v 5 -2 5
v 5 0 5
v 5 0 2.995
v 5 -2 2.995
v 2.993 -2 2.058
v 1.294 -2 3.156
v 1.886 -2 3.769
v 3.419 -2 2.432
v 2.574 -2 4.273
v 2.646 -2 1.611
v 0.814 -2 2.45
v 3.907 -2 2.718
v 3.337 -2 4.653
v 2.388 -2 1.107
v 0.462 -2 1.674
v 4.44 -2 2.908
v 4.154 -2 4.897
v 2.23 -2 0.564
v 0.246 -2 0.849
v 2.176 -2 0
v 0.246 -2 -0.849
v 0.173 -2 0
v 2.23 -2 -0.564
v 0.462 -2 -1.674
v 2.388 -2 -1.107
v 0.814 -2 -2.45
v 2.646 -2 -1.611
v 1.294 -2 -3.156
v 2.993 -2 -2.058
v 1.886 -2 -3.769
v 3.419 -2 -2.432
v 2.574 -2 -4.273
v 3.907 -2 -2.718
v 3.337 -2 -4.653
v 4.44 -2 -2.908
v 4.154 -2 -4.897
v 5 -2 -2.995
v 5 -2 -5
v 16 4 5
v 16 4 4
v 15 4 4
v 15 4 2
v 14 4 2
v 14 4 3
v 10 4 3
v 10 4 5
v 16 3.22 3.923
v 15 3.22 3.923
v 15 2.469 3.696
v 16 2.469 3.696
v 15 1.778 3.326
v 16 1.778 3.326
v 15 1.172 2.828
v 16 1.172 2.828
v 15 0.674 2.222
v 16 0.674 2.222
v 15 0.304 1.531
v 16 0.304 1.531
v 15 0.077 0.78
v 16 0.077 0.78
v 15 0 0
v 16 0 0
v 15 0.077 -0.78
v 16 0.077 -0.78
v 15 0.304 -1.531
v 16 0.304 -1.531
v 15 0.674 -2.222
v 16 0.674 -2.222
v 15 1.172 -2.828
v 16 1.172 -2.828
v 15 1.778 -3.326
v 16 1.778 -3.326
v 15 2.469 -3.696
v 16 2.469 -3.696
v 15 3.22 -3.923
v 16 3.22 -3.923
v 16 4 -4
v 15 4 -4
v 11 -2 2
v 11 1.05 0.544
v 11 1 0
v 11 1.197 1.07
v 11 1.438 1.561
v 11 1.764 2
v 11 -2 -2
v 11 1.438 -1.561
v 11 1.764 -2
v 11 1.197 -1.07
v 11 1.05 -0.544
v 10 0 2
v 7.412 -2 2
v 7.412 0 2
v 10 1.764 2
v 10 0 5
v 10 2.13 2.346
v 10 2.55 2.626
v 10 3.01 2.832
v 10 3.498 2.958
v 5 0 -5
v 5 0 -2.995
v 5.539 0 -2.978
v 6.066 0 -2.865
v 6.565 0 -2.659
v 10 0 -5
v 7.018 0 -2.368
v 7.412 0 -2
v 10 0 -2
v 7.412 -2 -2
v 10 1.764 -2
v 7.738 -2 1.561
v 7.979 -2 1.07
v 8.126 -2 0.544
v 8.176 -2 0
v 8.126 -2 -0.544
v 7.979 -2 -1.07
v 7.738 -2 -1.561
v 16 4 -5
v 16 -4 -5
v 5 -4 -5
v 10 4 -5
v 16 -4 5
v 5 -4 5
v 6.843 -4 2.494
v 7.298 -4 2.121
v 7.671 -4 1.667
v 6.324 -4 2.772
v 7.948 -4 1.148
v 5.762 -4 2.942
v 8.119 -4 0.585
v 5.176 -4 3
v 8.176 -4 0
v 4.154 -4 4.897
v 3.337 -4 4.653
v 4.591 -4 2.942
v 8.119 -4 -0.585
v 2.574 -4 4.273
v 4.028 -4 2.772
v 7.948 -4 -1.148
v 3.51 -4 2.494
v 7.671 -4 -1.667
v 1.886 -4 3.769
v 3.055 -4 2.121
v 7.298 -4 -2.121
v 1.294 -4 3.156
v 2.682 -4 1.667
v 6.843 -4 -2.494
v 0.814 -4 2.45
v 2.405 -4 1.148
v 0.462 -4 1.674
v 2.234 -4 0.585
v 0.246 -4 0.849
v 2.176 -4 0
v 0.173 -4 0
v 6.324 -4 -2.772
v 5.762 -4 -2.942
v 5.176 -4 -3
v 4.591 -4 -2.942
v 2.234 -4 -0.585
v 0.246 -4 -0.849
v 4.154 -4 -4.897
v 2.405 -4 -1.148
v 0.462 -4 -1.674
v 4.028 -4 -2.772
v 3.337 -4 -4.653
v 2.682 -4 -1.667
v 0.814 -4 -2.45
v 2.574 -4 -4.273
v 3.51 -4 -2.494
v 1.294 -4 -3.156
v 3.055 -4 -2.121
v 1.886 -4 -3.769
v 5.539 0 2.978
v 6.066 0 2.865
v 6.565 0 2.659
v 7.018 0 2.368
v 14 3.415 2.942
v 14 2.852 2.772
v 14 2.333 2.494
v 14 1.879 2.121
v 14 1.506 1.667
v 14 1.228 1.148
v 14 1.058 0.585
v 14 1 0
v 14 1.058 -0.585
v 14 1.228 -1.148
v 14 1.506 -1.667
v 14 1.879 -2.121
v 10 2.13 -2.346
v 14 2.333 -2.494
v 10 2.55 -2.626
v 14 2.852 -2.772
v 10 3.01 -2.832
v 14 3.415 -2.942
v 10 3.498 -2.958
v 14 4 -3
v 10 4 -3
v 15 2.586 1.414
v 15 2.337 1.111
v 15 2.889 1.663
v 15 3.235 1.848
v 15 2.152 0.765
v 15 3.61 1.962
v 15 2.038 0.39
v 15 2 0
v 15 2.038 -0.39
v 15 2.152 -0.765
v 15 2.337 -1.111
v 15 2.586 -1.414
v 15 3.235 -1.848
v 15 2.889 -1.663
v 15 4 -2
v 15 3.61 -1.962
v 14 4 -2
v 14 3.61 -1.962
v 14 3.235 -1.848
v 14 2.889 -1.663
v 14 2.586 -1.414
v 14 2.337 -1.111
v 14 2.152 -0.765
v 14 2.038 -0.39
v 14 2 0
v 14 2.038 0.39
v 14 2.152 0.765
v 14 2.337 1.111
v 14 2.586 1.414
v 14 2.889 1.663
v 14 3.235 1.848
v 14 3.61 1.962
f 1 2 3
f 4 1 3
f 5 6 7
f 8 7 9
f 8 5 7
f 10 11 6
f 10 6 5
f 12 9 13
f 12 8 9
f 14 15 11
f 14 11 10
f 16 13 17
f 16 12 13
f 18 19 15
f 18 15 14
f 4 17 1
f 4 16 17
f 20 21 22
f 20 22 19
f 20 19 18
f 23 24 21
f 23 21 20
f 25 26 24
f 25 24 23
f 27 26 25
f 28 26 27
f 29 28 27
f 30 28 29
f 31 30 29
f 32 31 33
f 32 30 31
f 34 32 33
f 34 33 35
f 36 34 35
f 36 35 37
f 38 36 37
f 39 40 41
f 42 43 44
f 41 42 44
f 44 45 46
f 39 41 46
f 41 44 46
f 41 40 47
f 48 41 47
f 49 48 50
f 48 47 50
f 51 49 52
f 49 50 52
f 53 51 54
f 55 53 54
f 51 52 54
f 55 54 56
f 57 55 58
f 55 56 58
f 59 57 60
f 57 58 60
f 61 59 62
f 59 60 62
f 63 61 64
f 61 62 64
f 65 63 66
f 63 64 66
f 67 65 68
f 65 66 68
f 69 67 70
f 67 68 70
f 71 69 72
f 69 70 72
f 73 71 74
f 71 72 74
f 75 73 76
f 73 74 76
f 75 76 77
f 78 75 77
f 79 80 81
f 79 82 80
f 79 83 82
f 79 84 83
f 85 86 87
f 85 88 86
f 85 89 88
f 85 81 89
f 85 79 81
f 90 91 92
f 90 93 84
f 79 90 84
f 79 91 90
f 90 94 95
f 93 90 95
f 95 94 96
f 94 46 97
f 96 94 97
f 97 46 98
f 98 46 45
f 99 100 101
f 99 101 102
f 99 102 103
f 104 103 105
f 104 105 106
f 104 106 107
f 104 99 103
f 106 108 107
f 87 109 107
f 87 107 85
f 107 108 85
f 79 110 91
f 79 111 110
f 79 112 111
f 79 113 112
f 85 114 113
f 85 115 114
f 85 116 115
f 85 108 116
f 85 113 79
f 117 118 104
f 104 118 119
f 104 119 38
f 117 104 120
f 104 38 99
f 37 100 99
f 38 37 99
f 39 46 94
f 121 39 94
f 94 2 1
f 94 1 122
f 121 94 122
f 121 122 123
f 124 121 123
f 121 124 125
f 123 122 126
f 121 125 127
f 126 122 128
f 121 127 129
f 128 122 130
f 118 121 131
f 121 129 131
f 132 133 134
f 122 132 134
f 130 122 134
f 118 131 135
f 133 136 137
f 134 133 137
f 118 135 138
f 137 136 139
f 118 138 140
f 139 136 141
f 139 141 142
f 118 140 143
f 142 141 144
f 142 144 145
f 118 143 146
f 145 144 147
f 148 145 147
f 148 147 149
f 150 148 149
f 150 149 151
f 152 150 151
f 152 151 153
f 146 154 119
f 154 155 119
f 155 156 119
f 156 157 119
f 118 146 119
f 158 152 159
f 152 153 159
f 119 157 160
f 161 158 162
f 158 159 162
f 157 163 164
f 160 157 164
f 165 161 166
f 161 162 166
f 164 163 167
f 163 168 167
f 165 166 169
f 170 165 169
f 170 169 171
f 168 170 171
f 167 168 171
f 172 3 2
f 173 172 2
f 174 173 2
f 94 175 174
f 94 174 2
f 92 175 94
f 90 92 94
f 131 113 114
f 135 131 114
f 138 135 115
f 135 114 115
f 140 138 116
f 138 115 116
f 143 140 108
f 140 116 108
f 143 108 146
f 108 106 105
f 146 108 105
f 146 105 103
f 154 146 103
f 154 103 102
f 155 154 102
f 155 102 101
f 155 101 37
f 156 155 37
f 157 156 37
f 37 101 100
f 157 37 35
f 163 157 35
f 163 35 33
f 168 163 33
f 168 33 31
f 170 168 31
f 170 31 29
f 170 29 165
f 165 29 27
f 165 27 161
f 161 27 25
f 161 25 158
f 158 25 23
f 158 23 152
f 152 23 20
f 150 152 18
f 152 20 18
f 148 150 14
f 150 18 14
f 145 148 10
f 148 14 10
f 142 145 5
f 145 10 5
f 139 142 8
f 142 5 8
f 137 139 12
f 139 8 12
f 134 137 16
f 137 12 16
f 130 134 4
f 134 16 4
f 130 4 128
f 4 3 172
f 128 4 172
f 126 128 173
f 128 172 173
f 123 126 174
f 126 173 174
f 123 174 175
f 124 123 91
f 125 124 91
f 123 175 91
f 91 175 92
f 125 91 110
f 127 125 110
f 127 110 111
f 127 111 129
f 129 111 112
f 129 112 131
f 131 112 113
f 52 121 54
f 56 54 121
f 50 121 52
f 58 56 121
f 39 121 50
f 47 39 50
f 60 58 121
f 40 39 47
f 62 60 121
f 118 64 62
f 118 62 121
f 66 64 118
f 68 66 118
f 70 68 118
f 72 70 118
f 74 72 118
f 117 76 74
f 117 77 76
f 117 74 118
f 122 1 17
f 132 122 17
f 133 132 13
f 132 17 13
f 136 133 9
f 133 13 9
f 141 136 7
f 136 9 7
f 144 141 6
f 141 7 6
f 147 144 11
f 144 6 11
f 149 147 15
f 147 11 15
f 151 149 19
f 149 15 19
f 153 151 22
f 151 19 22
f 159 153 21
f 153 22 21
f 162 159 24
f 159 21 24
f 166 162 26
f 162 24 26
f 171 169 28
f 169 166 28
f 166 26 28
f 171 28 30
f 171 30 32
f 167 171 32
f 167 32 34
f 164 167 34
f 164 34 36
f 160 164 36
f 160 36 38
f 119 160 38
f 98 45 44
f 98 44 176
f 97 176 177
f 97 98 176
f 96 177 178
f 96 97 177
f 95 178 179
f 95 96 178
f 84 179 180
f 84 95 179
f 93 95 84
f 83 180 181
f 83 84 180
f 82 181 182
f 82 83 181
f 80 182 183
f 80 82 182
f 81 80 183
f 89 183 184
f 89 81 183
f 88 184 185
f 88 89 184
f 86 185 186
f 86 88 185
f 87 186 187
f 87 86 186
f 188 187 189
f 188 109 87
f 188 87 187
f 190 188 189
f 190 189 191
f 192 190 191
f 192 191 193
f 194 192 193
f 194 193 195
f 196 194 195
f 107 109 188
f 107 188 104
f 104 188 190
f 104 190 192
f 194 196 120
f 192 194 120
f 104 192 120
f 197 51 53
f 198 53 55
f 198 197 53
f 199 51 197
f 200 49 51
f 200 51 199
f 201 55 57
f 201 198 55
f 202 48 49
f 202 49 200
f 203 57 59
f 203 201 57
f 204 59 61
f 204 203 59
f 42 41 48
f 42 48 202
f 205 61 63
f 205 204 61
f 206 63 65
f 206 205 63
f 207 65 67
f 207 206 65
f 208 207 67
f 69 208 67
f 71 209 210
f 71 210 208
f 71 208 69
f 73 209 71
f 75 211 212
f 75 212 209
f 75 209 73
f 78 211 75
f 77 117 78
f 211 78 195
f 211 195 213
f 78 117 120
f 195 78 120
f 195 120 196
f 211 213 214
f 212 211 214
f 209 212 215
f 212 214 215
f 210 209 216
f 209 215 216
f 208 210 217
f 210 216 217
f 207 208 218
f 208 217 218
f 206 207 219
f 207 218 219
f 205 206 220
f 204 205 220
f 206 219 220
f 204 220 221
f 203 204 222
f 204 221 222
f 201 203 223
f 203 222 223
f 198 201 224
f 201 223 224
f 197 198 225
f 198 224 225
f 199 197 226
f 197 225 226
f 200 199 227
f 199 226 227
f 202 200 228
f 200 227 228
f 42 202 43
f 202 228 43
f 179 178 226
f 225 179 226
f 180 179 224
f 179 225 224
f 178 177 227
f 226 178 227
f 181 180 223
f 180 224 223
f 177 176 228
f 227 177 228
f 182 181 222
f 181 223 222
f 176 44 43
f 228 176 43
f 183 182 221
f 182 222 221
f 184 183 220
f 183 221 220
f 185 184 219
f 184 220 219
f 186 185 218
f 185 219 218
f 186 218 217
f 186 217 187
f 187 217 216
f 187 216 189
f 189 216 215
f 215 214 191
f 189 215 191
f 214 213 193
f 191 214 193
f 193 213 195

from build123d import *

# Parameters (mm, degrees)
BOSS_EXTRUDE1_DEPTH     = 16
SKETCH2_R               = 3
CUT_EXTRUDE1_DEPTH      = 18
SKETCH3_R               = 4
CUT_EXTRUDE2_DEPTH      = 1
SKETCH4_R               = 3
CUT_EXTRUDE3_DEPTH      = 14
SKETCH5_W               = 6.803133859
SKETCH5_H               = 10.102230074
CUT_EXTRUDE4_DEPTH      = 6
SKETCH6_W               = 5
SKETCH6_H               = 10
CUT_EXTRUDE5_DEPTH      = 4
SKETCH7_W               = 6.342903926
SKETCH7_H               = 4
CUT_EXTRUDE6_DEPTH      = 4
CUT_EXTRUDE6_DEPTH_BACK = 2


with BuildPart() as part:
    # Sketch1 → Boss-Extrude1 (new body)
    with BuildSketch(Plane(origin=(0, 0, 0), x_dir=(0, 0, -1), z_dir=(1, 0, 0))):
        with BuildLine():
            Line((-2, 4), (-5, 4))
            Line((-5, 4), (-5, -4))
            Line((-5, -4), (5, -4))
            Line((5, -4), (5, 4))
            Line((5, 4), (2, 4))
            ThreePointArc((2, 4), (0, 2), (-2, 4))
        make_face()
    extrude(amount=BOSS_EXTRUDE1_DEPTH)

    # Sketch2 → Cut-Extrude1 (cut)
    with BuildSketch(Plane(origin=(0, 4, 0), x_dir=(1, 0, 0), z_dir=(0, 1, 0))):
        with Locations((5.17622925, 0)):
            Circle(SKETCH2_R)
        with BuildLine():
            Line((5, 5), (0, 5))
            Line((0, 5), (0, -5))
            Line((0, -5), (5, -5))
            ThreePointArc((5, -5), (0.173124539, 0), (5, 5))
        make_face()
    extrude(amount=-CUT_EXTRUDE1_DEPTH, mode=Mode.SUBTRACT)

    # Sketch3 → Cut-Extrude2 (cut)
    with BuildSketch(Plane(origin=(16, 0, 0), x_dir=(0, 0, -1), z_dir=(1, 0, 0))):
        with Locations((0, 4)):
            Circle(SKETCH3_R)
    extrude(amount=-CUT_EXTRUDE2_DEPTH, mode=Mode.SUBTRACT)

    # Sketch4 → Cut-Extrude3 (cut)
    with BuildSketch(Plane(origin=(0, 0, 0), x_dir=(0, 0, -1), z_dir=(1, 0, 0))):
        with Locations((0, 4)):
            Circle(SKETCH4_R)
    extrude(amount=CUT_EXTRUDE3_DEPTH, mode=Mode.SUBTRACT)

    # Sketch5 → Cut-Extrude4 (cut)
    with BuildSketch(Plane(origin=(0, 4, 0), x_dir=(1, 0, 0), z_dir=(0, 1, 0))):
        with Locations((1.598433071, -0.051115037)):
            Rectangle(SKETCH5_W, SKETCH5_H)
    extrude(amount=-CUT_EXTRUDE4_DEPTH, mode=Mode.SUBTRACT)

    # Sketch6 → Cut-Extrude5 (cut)
    with BuildSketch(Plane(origin=(0, 4, 0), x_dir=(1, 0, 0), z_dir=(0, 1, 0))):
        with Locations((7.5, 0)):
            Rectangle(SKETCH6_W, SKETCH6_H)
    extrude(amount=-CUT_EXTRUDE5_DEPTH, mode=Mode.SUBTRACT)

    # Sketch7 → Cut-Extrude6 (cut, two sides)
    with BuildSketch(Plane(origin=(0, 0, 0), x_dir=(1, 0, 0), z_dir=(0, 1, 0))) as cut_extrude6_sk:
        with Locations((7.828548037, 0)):
            Rectangle(SKETCH7_W, SKETCH7_H)
    extrude(amount=CUT_EXTRUDE6_DEPTH, mode=Mode.SUBTRACT)
    extrude(cut_extrude6_sk.sketch, amount=-CUT_EXTRUDE6_DEPTH_BACK, mode=Mode.SUBTRACT)


solid = part.part
